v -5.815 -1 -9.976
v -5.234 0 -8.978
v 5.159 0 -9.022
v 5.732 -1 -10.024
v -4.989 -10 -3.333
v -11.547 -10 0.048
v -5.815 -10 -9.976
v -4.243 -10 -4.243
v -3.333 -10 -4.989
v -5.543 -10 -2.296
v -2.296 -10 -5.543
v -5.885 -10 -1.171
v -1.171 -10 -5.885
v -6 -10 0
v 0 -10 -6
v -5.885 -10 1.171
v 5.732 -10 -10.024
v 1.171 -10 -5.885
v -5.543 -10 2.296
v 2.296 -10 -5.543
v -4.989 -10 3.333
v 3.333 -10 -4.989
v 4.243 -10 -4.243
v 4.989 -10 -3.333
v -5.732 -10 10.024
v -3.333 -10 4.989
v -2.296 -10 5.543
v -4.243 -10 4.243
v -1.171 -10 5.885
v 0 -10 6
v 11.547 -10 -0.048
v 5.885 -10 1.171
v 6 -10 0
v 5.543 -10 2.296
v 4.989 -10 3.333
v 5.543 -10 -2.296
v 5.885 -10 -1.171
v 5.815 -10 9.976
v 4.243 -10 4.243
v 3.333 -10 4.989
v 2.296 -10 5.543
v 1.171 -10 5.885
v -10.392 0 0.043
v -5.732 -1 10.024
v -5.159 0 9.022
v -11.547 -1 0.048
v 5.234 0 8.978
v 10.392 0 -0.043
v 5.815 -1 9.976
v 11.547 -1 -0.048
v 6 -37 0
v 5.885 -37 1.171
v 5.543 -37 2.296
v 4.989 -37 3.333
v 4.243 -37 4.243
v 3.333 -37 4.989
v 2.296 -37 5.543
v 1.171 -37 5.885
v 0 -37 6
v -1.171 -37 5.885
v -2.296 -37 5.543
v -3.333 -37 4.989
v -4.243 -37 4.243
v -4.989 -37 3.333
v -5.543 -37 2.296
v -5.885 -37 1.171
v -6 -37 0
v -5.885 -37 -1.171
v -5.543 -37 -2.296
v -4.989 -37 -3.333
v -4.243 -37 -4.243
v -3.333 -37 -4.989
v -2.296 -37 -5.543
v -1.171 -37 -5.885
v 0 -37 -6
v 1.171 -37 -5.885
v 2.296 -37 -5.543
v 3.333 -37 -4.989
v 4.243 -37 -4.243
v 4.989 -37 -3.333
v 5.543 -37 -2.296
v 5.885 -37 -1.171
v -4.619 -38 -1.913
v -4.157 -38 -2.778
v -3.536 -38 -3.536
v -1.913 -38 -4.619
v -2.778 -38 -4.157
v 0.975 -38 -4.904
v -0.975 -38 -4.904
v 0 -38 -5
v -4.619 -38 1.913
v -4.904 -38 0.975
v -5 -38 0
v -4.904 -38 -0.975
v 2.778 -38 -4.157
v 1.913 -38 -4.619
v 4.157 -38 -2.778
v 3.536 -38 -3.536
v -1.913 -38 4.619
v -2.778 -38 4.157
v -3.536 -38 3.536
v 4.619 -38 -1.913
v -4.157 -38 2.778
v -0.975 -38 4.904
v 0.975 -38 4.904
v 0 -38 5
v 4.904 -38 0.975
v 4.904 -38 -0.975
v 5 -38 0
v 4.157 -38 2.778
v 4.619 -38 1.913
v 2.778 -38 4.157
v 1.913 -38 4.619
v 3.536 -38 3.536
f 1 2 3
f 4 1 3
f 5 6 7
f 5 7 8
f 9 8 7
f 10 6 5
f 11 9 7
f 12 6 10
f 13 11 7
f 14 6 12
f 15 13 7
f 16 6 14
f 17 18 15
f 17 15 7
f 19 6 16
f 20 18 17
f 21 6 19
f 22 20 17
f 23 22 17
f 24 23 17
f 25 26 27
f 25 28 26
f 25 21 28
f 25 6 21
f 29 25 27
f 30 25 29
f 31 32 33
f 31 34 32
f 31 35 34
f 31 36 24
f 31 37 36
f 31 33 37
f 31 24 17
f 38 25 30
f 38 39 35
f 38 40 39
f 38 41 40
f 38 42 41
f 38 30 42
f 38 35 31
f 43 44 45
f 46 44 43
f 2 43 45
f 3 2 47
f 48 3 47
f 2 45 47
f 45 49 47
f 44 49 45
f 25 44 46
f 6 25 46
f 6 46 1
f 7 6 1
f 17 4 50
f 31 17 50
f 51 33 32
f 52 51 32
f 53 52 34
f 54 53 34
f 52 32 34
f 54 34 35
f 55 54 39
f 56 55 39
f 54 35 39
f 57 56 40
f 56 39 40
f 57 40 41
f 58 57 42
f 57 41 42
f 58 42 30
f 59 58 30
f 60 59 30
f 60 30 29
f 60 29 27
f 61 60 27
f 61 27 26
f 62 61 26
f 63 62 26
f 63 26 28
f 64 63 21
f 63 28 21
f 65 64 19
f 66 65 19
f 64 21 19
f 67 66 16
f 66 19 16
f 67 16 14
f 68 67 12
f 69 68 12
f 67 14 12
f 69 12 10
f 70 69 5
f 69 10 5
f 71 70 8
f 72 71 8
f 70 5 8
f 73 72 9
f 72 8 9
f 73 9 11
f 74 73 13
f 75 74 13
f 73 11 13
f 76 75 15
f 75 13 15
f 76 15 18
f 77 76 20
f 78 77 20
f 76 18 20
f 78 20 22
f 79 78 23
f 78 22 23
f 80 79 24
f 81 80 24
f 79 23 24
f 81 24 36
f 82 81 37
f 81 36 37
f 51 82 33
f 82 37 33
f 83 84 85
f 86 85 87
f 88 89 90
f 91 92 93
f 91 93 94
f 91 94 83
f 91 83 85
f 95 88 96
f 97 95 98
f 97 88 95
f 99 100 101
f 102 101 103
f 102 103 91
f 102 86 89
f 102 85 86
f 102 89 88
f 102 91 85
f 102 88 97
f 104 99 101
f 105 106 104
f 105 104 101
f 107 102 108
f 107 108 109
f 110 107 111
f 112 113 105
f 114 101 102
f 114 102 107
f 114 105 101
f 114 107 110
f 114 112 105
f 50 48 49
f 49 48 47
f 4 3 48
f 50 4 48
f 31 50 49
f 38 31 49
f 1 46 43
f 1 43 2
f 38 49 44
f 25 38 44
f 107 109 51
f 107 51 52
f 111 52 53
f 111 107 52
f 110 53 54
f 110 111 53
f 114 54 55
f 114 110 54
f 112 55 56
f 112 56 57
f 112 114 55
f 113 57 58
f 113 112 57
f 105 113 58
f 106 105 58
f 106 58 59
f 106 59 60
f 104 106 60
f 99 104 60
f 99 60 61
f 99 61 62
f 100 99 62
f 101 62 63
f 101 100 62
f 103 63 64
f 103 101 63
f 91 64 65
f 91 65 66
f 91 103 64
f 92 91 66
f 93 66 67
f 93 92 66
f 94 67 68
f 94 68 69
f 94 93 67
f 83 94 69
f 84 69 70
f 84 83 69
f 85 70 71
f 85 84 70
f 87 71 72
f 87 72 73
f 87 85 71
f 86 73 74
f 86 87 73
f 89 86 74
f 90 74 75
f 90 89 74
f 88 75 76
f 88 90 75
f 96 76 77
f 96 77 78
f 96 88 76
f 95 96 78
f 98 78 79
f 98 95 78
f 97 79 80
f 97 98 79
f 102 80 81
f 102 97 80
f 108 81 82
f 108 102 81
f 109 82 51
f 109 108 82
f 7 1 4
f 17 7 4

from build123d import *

# Parameters (mm, degrees)
F1_DEPTH = 10
F2_R     = 6
F3_DEPTH = 28
F4_SIZE  = 1


with BuildPart() as f1:
    # F0 (on Front) → F1 (new body)
    with BuildSketch(Plane.XZ):
        Polygon((5.731821, -10.023949), (11.546905, -0.048072), (5.815084, 9.975877), (-5.731821, 10.023949), (-11.546905, 0.048072), (-5.815084, -9.975877), align=None)
    extrude(amount=F1_DEPTH)

    # F2 (on face) → F3 (join)
    with BuildSketch(Plane.XZ.offset(10)):
        Circle(F2_R)
    extrude(amount=F3_DEPTH)

    # F4
    f4_edges = [f1.edges().sort_by_distance(p)[0] for p in [
        (-8.639363, 0, 5.036011),
        (0.041632, 0, 9.999913),
        (8.680995, 0, 4.963902),
        (8.639363, 0, -5.036011),
        (-0.041632, 0, -9.999913),
        (-8.680995, 0, -4.963902),
        (-6, -38, 0),
    ]]
    chamfer(f4_edges, length=F4_SIZE)


solid = f1.part
